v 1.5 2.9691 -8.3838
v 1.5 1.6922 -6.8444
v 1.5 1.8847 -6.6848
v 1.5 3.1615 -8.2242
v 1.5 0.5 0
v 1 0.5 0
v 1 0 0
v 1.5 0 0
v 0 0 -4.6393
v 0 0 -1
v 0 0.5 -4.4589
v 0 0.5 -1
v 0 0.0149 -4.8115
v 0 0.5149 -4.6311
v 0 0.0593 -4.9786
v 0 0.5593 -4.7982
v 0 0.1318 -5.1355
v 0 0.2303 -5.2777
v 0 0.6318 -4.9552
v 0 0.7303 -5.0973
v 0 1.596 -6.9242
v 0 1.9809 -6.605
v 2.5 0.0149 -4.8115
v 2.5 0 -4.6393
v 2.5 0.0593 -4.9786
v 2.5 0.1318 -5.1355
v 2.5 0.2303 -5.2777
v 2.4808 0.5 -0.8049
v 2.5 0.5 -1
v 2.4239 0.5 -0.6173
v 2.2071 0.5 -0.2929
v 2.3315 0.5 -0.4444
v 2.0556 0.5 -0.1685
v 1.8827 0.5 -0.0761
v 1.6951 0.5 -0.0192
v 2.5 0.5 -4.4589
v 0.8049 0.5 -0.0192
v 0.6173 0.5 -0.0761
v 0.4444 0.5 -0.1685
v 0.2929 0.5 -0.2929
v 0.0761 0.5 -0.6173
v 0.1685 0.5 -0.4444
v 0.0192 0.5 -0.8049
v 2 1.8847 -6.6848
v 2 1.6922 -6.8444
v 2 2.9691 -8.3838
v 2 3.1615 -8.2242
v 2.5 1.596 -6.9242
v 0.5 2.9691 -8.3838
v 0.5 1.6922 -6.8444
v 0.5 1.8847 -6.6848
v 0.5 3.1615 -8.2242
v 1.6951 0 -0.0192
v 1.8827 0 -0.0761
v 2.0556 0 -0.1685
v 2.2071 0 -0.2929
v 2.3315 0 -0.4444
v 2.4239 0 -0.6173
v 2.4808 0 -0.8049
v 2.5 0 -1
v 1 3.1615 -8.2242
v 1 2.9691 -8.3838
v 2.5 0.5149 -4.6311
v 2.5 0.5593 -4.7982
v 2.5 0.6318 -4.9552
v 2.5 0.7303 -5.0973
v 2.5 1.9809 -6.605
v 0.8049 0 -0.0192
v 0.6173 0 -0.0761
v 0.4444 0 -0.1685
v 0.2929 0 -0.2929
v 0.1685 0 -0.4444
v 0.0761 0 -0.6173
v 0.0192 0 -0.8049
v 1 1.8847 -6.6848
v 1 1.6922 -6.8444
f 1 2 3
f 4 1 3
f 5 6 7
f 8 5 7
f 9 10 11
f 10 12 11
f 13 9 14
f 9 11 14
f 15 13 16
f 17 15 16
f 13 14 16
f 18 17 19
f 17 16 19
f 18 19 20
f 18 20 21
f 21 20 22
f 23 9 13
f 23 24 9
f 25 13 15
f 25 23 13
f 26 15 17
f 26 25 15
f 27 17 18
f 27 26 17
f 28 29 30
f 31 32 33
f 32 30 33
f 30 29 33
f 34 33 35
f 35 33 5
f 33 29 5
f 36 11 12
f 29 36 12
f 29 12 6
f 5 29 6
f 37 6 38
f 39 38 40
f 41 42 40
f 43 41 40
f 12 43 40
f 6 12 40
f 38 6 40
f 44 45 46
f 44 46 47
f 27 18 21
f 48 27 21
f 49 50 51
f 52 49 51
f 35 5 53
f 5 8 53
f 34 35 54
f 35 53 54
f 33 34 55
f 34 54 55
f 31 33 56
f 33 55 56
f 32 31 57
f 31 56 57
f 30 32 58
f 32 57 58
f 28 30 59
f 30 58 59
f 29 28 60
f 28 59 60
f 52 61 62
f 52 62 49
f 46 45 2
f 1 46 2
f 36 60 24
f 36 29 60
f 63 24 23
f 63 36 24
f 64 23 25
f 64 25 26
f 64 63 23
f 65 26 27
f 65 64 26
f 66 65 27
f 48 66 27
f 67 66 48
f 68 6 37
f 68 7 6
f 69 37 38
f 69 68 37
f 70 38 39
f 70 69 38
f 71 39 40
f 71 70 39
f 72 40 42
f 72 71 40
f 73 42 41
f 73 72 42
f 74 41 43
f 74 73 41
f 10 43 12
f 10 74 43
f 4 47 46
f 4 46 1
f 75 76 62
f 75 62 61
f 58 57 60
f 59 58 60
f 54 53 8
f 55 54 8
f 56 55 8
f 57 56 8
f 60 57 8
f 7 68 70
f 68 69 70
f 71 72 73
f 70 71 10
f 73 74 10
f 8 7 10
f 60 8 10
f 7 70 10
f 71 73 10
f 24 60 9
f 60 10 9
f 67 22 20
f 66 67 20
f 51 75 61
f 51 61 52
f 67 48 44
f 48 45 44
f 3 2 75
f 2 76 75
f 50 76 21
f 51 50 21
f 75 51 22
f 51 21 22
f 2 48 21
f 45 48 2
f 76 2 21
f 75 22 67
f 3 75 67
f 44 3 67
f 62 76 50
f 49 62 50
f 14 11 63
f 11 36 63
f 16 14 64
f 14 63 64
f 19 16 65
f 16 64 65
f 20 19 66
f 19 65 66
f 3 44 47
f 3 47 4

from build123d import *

# Parameters (mm, degrees)
BOSS_EXTRUDE1_DEPTH = 2.5
FILLET1_R           = 1
FILLET2_R           = 1
SKETCH3_W           = 0.5
SKETCH3_H           = 0.25
BOSS_EXTRUDE2_DEPTH = 2


with BuildPart() as part:
    # Sketch1 → Boss-Extrude1 (new body)
    with BuildSketch(Plane(origin=(0, 0, 0), x_dir=(0, 0, -1), z_dir=(1, 0, 0))):
        Polygon((0, 0), (5, 0), (6.924233249, 1.596034587), (6.605026331, 1.980881237), (4.819625854, 0.5), (0, 0.5), align=None)
    extrude(amount=BOSS_EXTRUDE1_DEPTH)

    # Fillet1
    fillet1_edges = [part.edges().sort_by_distance(p)[0] for p in [
        (2.5, 0.25, 0),
        (0, 0.25, 0),
    ]]
    fillet(fillet1_edges, radius=FILLET1_R)

    # Fillet2
    fillet2_edges = [part.edges().sort_by_distance(p)[0] for p in [
        (1.25, 0.5, -4.819625854),
        (1.25, 0, -5),
    ]]
    fillet(fillet2_edges, radius=FILLET2_R)

    # Sketch3 → Boss-Extrude2 (add)
    with BuildSketch(Plane(origin=(0, 4.052948843, -4.886372126), x_dir=(-1, 0, 0), z_dir=(0, 0.6384138349157521, -0.7696932995603917))):
        with Locations((-1.75, -2.942069175)):
            Rectangle(SKETCH3_W, SKETCH3_H)
        with Locations((-0.75, -2.942069175)):
            Rectangle(SKETCH3_W, SKETCH3_H)
    extrude(amount=BOSS_EXTRUDE2_DEPTH)


solid = part.part
